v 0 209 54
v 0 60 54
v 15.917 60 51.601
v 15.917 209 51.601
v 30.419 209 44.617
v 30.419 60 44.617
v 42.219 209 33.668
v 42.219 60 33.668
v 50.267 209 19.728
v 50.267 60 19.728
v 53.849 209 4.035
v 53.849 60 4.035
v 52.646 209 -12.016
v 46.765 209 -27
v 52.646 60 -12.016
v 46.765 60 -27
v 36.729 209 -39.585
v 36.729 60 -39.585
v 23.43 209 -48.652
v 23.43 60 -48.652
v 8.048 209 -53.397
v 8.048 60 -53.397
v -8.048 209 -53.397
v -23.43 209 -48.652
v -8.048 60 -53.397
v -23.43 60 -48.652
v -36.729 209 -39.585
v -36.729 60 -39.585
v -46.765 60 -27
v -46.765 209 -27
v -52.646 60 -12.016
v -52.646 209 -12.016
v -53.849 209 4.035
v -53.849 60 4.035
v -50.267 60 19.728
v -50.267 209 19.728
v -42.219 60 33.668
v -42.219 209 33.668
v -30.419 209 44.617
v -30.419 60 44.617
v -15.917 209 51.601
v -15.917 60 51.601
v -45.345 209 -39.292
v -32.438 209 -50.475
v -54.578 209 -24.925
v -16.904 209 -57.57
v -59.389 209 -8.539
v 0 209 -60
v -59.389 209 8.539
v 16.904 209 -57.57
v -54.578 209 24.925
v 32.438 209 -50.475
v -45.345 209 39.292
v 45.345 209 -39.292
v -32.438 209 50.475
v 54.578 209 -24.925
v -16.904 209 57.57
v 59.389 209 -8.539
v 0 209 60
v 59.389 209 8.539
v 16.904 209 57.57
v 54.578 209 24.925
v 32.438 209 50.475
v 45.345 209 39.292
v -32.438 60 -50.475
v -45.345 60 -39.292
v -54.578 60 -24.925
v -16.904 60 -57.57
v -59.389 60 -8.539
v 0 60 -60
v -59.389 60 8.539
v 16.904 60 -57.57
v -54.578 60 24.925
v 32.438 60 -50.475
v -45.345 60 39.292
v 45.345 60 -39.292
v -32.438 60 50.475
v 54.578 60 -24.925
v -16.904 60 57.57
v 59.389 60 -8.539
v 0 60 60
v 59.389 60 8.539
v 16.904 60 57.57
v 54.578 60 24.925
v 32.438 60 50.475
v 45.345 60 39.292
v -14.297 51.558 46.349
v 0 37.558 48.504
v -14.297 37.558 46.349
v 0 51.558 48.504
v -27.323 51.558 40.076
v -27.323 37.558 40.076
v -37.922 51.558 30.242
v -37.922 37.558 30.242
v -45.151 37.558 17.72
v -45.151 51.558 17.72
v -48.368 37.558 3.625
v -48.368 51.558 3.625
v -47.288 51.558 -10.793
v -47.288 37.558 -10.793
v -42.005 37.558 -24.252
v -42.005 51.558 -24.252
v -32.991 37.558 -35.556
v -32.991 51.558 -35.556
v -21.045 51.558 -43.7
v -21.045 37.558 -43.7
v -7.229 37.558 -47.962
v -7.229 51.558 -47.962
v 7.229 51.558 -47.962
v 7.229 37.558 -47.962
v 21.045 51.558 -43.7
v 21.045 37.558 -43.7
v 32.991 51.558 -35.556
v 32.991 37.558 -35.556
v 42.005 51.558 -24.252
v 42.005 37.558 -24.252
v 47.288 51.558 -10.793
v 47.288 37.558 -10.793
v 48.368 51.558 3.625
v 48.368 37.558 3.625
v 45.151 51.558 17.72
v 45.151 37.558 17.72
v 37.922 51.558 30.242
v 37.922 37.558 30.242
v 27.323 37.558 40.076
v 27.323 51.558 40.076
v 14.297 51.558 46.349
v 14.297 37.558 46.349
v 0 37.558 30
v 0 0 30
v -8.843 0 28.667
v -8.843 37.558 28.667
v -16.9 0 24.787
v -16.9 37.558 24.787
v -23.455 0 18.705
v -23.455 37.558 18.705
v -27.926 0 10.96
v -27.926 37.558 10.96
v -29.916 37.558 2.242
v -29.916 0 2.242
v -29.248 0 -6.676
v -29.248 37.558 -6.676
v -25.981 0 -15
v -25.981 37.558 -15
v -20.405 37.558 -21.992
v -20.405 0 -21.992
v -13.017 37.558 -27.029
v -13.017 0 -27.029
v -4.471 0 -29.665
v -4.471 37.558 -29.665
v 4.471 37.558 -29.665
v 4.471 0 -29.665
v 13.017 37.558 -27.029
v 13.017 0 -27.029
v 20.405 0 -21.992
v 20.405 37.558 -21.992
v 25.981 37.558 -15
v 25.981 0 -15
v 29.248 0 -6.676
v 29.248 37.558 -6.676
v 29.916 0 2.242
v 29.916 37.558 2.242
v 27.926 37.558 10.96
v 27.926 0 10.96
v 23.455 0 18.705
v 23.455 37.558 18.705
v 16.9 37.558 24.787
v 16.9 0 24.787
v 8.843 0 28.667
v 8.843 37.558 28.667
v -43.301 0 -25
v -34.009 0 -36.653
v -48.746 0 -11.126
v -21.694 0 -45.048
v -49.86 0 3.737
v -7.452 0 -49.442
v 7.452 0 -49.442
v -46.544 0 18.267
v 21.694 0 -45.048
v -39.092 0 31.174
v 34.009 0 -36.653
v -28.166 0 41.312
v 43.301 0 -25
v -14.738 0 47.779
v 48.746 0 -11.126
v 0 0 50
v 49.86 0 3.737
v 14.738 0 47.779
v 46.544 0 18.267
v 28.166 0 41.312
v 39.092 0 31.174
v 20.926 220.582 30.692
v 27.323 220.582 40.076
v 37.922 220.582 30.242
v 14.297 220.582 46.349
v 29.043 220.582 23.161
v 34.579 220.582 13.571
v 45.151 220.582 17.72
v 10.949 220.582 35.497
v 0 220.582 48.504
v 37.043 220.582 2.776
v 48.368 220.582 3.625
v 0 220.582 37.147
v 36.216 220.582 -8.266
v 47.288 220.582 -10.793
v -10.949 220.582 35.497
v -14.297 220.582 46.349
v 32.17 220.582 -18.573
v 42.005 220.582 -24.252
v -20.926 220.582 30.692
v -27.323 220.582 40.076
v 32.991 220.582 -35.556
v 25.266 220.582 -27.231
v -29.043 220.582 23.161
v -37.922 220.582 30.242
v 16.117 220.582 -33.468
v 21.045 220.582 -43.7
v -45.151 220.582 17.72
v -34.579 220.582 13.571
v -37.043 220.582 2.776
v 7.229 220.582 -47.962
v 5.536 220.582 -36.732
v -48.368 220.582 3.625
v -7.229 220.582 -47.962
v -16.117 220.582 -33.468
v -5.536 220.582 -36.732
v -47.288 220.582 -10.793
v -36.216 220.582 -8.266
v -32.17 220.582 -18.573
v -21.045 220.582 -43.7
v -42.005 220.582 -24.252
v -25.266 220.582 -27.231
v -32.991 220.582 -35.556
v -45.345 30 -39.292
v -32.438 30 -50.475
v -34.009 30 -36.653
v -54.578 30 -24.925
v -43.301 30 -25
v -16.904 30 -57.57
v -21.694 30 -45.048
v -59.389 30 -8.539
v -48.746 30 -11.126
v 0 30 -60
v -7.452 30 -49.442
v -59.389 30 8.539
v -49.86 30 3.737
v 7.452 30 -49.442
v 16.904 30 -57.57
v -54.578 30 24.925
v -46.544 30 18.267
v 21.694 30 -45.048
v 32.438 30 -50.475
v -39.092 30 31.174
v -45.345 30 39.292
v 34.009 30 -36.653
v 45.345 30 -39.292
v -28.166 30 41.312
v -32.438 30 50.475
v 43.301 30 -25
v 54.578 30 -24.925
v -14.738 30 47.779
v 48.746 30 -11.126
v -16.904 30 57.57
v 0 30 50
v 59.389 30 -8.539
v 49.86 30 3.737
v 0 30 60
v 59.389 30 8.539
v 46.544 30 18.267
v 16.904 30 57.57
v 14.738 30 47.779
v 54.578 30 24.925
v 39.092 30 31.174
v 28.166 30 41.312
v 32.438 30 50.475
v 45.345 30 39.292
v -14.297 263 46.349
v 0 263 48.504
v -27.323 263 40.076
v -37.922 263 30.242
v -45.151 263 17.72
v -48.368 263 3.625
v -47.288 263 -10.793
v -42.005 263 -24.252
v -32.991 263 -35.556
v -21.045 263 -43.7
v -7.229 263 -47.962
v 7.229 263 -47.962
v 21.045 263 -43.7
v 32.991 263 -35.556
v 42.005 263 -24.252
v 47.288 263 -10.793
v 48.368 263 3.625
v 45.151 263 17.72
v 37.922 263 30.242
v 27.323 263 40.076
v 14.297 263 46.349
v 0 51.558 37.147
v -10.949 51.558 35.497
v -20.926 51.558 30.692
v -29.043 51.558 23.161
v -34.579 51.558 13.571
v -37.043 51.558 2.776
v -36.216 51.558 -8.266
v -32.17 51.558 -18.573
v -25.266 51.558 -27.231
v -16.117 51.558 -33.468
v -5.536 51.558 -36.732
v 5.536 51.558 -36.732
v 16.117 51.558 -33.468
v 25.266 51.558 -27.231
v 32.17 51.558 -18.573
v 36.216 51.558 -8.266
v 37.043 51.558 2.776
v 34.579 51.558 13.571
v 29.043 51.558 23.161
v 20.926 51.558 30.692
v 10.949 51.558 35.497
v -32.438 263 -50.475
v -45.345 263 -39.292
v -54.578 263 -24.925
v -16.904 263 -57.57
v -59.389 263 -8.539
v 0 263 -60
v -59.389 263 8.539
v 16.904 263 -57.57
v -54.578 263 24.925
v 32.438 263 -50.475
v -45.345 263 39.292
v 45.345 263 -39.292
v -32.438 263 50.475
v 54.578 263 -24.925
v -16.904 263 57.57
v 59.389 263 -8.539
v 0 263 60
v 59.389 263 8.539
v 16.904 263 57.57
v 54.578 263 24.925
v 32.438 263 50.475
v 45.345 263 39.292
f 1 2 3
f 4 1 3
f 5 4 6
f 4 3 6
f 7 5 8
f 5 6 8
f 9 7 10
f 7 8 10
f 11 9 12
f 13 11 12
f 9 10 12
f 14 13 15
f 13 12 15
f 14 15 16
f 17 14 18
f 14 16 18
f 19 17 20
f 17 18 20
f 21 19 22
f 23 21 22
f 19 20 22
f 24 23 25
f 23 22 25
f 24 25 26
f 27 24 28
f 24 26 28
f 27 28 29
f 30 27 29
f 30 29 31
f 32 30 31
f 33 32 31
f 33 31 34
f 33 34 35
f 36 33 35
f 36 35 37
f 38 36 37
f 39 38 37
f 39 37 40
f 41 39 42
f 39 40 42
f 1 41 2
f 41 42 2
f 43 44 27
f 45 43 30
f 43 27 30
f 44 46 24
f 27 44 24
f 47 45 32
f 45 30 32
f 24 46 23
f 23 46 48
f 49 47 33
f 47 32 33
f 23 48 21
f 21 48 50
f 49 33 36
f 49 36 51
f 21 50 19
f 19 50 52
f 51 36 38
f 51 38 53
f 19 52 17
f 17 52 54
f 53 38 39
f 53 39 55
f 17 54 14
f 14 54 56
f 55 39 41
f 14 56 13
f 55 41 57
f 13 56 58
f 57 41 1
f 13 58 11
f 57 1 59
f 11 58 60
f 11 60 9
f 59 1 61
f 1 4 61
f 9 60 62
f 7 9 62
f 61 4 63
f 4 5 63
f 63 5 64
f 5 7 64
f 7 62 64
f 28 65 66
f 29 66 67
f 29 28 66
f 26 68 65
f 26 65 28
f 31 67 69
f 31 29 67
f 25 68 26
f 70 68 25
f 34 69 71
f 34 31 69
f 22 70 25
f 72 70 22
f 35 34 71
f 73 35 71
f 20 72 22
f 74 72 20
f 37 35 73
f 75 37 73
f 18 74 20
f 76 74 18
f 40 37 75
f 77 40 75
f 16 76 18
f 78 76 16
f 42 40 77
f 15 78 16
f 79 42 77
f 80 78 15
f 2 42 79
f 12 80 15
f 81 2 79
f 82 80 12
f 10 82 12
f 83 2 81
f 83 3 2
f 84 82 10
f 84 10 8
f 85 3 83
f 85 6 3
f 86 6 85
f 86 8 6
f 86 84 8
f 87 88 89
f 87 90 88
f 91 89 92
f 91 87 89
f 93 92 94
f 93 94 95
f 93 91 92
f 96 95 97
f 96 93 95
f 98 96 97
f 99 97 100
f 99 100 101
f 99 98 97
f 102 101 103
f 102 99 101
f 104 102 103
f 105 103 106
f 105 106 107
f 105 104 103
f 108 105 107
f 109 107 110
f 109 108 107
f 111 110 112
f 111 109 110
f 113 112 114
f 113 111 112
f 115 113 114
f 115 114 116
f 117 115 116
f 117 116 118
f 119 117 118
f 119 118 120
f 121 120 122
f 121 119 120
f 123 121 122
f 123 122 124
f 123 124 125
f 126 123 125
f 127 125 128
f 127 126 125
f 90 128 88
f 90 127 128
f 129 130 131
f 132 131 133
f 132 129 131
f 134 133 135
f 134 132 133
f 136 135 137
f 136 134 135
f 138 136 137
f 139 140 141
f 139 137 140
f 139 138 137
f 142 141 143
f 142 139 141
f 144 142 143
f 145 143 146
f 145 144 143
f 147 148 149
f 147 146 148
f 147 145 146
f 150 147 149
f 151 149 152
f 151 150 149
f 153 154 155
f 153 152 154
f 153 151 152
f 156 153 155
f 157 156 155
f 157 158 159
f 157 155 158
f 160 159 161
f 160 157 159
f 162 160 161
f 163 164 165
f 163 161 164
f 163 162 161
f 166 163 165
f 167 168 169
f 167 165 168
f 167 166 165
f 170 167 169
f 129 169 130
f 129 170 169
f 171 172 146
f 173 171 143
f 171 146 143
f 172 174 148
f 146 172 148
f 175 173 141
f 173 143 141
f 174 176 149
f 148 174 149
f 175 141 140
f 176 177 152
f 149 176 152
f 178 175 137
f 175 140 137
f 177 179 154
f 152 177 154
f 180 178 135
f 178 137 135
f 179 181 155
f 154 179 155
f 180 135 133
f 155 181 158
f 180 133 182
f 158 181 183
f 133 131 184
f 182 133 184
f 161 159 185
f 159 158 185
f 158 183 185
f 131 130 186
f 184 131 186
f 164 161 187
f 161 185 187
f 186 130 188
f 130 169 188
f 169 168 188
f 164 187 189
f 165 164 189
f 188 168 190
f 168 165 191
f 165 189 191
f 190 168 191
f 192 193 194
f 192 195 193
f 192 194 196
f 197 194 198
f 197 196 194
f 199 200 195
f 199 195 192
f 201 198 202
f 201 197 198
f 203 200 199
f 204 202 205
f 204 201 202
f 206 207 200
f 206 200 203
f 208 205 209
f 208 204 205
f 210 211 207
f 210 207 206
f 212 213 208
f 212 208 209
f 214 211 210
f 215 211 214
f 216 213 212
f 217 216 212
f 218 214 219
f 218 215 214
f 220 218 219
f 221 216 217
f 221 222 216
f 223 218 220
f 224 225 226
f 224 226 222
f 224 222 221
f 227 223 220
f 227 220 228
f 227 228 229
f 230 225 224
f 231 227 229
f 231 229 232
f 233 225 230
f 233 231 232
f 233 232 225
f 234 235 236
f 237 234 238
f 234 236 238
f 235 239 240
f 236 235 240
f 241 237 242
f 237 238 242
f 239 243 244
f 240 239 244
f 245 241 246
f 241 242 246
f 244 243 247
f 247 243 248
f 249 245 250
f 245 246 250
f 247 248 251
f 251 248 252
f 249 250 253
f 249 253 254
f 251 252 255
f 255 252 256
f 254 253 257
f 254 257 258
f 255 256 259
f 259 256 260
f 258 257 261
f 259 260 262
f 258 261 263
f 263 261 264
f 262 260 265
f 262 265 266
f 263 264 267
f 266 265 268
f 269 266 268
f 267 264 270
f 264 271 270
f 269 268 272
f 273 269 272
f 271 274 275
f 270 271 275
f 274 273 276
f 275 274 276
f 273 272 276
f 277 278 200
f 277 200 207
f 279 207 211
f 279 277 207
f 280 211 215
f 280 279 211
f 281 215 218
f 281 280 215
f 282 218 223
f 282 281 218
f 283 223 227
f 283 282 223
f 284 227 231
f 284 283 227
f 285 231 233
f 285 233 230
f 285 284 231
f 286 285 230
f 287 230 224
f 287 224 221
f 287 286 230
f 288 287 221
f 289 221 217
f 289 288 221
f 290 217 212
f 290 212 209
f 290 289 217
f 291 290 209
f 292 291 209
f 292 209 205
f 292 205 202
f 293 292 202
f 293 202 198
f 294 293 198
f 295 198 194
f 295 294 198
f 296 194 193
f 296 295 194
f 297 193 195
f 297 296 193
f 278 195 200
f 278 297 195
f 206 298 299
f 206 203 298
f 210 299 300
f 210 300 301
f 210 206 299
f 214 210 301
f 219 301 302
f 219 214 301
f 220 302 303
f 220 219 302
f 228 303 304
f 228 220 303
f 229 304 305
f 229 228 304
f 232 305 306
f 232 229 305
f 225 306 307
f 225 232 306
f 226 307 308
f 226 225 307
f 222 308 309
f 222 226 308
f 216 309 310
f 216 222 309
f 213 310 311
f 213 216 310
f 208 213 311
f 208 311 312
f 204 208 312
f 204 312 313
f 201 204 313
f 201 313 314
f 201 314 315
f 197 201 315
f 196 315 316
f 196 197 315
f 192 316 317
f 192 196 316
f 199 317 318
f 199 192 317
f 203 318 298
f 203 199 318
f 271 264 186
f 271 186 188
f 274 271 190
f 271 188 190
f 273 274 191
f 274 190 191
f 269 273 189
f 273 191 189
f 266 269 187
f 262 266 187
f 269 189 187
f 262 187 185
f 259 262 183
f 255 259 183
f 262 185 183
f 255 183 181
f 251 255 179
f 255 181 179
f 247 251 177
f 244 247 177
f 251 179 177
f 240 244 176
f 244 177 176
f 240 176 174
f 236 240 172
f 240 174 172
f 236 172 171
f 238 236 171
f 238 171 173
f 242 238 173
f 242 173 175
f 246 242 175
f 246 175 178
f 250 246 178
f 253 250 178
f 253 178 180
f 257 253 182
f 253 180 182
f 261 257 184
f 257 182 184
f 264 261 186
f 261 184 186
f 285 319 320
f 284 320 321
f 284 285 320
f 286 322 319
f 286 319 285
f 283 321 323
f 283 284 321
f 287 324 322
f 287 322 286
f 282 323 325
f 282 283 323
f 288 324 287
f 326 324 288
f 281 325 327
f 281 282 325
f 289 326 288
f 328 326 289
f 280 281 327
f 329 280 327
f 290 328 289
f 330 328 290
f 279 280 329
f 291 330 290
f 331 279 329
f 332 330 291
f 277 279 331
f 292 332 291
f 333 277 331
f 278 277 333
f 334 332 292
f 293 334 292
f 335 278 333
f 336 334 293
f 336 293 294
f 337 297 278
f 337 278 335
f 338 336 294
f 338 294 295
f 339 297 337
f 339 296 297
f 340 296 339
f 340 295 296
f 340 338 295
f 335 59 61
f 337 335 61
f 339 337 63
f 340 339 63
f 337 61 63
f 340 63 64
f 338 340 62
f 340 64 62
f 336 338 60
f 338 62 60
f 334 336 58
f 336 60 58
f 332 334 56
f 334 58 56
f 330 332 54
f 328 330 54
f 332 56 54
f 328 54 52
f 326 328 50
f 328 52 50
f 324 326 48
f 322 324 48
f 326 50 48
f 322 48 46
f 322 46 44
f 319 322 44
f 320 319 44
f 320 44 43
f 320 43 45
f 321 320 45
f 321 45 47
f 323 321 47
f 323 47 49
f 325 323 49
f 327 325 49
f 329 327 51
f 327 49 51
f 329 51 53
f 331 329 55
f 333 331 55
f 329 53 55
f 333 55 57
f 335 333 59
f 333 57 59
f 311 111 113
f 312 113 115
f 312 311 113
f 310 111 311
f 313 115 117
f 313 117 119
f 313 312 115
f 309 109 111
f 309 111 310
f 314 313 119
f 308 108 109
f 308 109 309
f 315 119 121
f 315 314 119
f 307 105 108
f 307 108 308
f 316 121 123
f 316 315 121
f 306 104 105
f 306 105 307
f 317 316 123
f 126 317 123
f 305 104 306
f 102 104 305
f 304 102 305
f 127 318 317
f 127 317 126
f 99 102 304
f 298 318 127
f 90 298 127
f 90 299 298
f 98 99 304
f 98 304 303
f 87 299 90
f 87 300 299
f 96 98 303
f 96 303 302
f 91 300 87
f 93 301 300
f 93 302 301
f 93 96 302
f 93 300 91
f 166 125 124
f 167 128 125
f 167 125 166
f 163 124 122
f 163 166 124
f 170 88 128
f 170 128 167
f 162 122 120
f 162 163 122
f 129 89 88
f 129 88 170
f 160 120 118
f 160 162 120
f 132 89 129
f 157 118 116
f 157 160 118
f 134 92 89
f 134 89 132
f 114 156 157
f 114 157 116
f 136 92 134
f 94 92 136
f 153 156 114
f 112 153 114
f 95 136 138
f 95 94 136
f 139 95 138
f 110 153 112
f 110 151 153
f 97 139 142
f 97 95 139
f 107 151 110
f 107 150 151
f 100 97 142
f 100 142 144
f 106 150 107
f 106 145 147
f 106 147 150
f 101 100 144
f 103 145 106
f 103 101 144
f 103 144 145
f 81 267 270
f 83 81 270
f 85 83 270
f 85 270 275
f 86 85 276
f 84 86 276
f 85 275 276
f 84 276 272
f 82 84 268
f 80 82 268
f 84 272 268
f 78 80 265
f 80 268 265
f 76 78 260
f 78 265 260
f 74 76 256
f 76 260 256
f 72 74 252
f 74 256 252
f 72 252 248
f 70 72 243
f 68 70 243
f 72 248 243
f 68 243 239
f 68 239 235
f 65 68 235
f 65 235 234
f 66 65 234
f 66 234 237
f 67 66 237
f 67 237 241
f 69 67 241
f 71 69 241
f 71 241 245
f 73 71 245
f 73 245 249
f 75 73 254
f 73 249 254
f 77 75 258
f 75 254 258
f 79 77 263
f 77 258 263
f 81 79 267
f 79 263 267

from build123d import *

# Parameters (mm, degrees)
SKETCH1_R           = 50
BOSS_EXTRUDE2_DEPTH = 30
SKETCH3_R           = 60
BOSS_EXTRUDE3_DEPTH = 30
SKETCH4_R           = 54
BOSS_EXTRUDE4_DEPTH = 149
SKETCH5_R           = 60
BOSS_EXTRUDE5_DEPTH = 54


with BuildPart() as part:
    # Sketch1 → Boss-Extrude2 (new body)
    with BuildSketch(Plane(origin=(0, 0, 0), x_dir=(1, 0, 0), z_dir=(0, 1, 0))):
        Circle(SKETCH1_R)
    extrude(amount=BOSS_EXTRUDE2_DEPTH)

    # Sketch3 → Boss-Extrude3 (add)
    with BuildSketch(Plane(origin=(0, 30, 0), x_dir=(1, 0, 0), z_dir=(0, 1, 0))):
        Circle(SKETCH3_R)
    extrude(amount=BOSS_EXTRUDE3_DEPTH)

    # Sketch4 → Boss-Extrude4 (add)
    with BuildSketch(Plane(origin=(0, 60, 0), x_dir=(1, 0, 0), z_dir=(0, 1, 0))):
        Circle(SKETCH4_R)
    extrude(amount=BOSS_EXTRUDE4_DEPTH)

    # Sketch5 → Boss-Extrude5 (add)
    with BuildSketch(Plane(origin=(0, 209, 0), x_dir=(1, 0, 0), z_dir=(0, 1, 0))):
        Circle(SKETCH5_R)
    extrude(amount=BOSS_EXTRUDE5_DEPTH)

    # Sketch7 → Cut-Revolve3 (revolve, cut)
    with BuildSketch(Plane.XY):
        Polygon((0, 273.958246316), (0, -7.633446841), (-30, -7.633446841), (-30, 37.558235381), (-48.50368091, 37.558235381), (-48.50368091, 51.558235381), (-37.146978401, 51.558235381), (-37.146978401, 220.582243692), (-48.50368091, 220.582243692), (-48.50368091, 273.958246316), align=None)
    revolve(axis=Axis((0, 273.958246316, 0), (0, -1, 0)), mode=Mode.SUBTRACT)


solid = part.part
